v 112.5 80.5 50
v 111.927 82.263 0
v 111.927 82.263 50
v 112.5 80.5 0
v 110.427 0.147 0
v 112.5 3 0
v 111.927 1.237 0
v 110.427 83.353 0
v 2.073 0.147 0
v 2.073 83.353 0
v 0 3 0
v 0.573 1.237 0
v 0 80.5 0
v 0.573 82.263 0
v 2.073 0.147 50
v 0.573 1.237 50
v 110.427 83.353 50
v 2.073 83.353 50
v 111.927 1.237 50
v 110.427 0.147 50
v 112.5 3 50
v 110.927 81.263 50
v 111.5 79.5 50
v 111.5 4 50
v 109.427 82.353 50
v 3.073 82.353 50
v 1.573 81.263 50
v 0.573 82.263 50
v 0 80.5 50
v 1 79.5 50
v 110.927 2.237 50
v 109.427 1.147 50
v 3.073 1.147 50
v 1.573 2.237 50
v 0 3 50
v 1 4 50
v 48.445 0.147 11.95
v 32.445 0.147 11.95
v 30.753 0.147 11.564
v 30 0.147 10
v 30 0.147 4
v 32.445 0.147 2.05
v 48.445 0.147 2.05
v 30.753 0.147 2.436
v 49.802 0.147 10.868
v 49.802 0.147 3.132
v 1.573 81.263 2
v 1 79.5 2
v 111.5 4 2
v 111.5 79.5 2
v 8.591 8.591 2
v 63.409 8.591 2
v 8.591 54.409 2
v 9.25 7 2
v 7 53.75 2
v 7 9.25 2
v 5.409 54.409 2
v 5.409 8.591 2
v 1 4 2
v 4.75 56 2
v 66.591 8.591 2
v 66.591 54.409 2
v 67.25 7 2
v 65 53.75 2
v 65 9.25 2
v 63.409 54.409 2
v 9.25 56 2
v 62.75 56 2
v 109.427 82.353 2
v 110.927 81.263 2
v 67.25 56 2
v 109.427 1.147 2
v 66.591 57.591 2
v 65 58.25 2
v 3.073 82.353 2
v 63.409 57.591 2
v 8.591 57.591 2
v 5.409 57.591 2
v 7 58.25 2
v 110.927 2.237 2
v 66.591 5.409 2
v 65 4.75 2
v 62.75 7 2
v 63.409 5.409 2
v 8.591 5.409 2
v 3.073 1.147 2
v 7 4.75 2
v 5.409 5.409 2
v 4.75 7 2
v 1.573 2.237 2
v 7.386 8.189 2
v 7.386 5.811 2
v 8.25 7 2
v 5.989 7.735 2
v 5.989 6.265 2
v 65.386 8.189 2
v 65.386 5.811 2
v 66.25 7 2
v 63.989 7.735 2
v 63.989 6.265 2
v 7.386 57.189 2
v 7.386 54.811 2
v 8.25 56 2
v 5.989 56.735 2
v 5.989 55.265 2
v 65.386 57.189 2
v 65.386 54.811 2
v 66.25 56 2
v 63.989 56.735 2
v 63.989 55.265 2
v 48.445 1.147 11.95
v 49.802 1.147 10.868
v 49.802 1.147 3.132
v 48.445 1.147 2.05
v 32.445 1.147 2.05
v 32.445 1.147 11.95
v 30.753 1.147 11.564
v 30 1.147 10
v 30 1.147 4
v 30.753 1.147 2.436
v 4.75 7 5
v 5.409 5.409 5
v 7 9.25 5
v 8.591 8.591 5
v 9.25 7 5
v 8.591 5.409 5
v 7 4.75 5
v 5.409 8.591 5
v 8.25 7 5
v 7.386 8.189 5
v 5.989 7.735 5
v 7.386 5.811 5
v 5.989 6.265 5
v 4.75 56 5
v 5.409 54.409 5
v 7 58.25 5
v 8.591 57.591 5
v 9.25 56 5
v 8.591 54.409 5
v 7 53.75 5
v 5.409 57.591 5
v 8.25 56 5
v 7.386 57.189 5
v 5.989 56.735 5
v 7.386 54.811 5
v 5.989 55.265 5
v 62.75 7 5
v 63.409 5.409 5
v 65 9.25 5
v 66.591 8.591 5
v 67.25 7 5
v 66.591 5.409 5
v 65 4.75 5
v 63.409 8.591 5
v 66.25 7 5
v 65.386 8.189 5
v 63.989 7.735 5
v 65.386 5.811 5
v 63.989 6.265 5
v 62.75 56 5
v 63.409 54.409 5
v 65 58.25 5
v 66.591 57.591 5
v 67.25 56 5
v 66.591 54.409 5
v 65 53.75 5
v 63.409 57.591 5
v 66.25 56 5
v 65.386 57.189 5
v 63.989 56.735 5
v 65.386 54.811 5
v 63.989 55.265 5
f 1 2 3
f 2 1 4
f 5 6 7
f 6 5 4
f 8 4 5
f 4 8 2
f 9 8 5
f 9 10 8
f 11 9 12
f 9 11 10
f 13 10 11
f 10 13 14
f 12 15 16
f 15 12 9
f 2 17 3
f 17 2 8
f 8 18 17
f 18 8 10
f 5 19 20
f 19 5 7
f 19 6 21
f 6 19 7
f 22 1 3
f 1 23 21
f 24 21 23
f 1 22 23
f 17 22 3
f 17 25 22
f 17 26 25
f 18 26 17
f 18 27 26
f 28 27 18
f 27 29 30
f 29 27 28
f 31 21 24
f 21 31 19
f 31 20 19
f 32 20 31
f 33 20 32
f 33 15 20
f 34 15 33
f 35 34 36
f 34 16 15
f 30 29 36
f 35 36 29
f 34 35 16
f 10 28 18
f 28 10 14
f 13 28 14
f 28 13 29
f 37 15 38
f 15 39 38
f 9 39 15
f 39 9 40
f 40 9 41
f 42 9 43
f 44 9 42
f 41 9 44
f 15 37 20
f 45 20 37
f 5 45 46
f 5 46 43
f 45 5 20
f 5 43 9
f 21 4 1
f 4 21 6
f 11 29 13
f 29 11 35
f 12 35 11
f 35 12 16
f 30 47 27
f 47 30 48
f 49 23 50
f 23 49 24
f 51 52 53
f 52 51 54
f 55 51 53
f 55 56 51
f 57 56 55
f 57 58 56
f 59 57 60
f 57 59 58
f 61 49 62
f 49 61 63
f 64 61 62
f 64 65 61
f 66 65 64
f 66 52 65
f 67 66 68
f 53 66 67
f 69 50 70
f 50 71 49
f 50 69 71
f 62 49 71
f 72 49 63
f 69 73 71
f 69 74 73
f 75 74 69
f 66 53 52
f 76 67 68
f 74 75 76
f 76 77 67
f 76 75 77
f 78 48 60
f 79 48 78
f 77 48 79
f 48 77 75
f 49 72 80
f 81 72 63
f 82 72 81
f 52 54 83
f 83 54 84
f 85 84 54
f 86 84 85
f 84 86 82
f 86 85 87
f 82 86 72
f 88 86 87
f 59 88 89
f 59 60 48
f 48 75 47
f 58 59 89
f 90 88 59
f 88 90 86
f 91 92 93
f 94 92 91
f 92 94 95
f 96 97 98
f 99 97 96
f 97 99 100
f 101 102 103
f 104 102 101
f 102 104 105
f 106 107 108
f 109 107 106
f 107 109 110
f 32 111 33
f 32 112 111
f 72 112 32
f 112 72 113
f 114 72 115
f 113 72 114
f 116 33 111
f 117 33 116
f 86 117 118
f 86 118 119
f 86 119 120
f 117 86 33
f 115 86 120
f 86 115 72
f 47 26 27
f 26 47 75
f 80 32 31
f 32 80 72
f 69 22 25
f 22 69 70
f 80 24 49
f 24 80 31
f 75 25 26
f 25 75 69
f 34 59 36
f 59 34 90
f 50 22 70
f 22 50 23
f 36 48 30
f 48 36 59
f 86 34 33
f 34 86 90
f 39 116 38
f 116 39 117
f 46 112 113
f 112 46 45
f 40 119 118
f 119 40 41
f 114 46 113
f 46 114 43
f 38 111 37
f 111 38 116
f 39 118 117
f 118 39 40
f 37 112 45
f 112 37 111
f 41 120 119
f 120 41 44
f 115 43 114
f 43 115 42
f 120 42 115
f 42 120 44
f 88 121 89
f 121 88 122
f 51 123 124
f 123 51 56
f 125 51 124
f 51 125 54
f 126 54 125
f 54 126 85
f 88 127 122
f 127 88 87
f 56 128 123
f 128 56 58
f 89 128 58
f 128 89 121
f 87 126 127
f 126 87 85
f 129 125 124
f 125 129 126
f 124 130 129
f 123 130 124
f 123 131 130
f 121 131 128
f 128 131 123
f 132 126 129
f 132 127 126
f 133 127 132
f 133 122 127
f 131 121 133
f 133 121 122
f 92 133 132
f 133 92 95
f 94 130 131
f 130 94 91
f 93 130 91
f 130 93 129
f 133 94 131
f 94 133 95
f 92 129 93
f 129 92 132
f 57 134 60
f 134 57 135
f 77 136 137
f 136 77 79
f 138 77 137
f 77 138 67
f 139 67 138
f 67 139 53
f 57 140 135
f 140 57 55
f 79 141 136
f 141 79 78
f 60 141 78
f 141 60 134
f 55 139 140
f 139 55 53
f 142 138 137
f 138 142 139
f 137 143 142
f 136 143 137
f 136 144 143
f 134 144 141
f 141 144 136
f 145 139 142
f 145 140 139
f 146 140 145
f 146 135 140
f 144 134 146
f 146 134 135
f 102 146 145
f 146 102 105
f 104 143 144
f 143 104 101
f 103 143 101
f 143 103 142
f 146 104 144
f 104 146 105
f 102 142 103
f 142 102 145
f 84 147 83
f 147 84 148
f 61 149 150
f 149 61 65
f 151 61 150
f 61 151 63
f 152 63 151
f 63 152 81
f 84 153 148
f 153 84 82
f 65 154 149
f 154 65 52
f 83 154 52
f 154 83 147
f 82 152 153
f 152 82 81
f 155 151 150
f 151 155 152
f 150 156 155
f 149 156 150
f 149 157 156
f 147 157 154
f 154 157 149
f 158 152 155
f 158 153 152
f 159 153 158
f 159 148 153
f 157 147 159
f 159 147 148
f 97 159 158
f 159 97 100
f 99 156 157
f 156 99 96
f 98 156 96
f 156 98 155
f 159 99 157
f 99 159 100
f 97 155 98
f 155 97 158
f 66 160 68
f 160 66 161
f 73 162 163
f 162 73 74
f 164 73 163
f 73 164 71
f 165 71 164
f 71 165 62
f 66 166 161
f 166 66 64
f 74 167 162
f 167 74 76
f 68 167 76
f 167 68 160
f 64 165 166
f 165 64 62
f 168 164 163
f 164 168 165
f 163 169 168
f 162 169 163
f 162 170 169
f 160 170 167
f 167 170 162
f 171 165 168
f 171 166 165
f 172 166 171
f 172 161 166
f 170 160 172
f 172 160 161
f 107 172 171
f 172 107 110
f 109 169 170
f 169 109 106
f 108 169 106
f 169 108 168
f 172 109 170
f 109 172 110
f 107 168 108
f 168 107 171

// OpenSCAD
// file: rcube.scad
module rcube(size, radius) {
    echo(size=size,radius=radius);
    hull() {
        // BL
        if(radius[0] == 0) cube([1, 1, size[2]]);
        else translate([radius[0], radius[0]]) cylinder(r = radius[0], h = size[2]);
        // BR
        if(radius[1] == 0) translate([size[0] - 1, 0]) cube([1, 1, size[2]]);
        else translate([size[0] - radius[1], radius[1]]) cylinder(r = radius[1], h = size[2]);
        // TR
        if(radius[2] == 0) translate([size[0] - 1, size[1] - 1])cube([1, 1, size[2]]);
        else translate([size[0] - radius[2], size[1] - radius[2]]) cylinder(r = radius[2], h = size[2]);
        // TL
        if(radius[3] == 0) translate([0, size[1] - 1]) cube([1, 1, size[2]]);
        else translate([radius[3], size[1] - radius[3]]) cylinder(r = radius[3], h = size[2]);
    }
}
// main file
include <rcube.scad>
thickness=2;
pi_size = [85+27.5,56+27.5,50];
pi_h1=[7, 7, 0];
pi_hole_offset=[58, 49, 0];
pi_holes_r=2.5/2;
peg_height=5;
corner_r = [3,3,3,3];

module case()
{
    union(){
        difference() {
            rcube(pi_size, corner_r);
            translate([1, 1, 2]) rcube(pi_size-[2,2,1], corner_r);
        }
    }
}

module case_w_holes() {
    difference() {
        case();
        // power hole
        side_hole(20,10,[50,0,0],[2,2,2,2]);
        
        // audio jack
        
        // cable outs
    }
    
}

module top_plate(size, z_level) {
    echo(size=size, z_level=z_level);
}

module mounting_peg(h, r1, r2) {
    echo(h=h,r1=r1,r2=r2);
    difference() {
        cylinder(h, r=r2);
        translate([0,0,-1]) cylinder(h+2, r=r1);
    }
}

module side_hole(h,w,pos,r) {
    echo(h=h, w=w, pos=pos, r=r);
    if (pos.x == 0) {
        translate([pos.x-1, pos.y, thickness]) rotate([0,90,180]) rcube([h,w,thickness+2],r);
        }
    else {
        translate([pos.x, pos.y-1, thickness]) rotate([90,0,180]) rcube([h,w,thickness+2],r);
    }
}

union() {
    case_w_holes();
    for (i = [0:1]) {
        for (j = [0:1]) {
            translate([pi_h1[0] + (i*pi_hole_offset[0]), pi_h1[1] + (j*pi_hole_offset[1]), 0]) mounting_peg(peg_height, pi_holes_r, pi_holes_r+1);
        }
    }
}
